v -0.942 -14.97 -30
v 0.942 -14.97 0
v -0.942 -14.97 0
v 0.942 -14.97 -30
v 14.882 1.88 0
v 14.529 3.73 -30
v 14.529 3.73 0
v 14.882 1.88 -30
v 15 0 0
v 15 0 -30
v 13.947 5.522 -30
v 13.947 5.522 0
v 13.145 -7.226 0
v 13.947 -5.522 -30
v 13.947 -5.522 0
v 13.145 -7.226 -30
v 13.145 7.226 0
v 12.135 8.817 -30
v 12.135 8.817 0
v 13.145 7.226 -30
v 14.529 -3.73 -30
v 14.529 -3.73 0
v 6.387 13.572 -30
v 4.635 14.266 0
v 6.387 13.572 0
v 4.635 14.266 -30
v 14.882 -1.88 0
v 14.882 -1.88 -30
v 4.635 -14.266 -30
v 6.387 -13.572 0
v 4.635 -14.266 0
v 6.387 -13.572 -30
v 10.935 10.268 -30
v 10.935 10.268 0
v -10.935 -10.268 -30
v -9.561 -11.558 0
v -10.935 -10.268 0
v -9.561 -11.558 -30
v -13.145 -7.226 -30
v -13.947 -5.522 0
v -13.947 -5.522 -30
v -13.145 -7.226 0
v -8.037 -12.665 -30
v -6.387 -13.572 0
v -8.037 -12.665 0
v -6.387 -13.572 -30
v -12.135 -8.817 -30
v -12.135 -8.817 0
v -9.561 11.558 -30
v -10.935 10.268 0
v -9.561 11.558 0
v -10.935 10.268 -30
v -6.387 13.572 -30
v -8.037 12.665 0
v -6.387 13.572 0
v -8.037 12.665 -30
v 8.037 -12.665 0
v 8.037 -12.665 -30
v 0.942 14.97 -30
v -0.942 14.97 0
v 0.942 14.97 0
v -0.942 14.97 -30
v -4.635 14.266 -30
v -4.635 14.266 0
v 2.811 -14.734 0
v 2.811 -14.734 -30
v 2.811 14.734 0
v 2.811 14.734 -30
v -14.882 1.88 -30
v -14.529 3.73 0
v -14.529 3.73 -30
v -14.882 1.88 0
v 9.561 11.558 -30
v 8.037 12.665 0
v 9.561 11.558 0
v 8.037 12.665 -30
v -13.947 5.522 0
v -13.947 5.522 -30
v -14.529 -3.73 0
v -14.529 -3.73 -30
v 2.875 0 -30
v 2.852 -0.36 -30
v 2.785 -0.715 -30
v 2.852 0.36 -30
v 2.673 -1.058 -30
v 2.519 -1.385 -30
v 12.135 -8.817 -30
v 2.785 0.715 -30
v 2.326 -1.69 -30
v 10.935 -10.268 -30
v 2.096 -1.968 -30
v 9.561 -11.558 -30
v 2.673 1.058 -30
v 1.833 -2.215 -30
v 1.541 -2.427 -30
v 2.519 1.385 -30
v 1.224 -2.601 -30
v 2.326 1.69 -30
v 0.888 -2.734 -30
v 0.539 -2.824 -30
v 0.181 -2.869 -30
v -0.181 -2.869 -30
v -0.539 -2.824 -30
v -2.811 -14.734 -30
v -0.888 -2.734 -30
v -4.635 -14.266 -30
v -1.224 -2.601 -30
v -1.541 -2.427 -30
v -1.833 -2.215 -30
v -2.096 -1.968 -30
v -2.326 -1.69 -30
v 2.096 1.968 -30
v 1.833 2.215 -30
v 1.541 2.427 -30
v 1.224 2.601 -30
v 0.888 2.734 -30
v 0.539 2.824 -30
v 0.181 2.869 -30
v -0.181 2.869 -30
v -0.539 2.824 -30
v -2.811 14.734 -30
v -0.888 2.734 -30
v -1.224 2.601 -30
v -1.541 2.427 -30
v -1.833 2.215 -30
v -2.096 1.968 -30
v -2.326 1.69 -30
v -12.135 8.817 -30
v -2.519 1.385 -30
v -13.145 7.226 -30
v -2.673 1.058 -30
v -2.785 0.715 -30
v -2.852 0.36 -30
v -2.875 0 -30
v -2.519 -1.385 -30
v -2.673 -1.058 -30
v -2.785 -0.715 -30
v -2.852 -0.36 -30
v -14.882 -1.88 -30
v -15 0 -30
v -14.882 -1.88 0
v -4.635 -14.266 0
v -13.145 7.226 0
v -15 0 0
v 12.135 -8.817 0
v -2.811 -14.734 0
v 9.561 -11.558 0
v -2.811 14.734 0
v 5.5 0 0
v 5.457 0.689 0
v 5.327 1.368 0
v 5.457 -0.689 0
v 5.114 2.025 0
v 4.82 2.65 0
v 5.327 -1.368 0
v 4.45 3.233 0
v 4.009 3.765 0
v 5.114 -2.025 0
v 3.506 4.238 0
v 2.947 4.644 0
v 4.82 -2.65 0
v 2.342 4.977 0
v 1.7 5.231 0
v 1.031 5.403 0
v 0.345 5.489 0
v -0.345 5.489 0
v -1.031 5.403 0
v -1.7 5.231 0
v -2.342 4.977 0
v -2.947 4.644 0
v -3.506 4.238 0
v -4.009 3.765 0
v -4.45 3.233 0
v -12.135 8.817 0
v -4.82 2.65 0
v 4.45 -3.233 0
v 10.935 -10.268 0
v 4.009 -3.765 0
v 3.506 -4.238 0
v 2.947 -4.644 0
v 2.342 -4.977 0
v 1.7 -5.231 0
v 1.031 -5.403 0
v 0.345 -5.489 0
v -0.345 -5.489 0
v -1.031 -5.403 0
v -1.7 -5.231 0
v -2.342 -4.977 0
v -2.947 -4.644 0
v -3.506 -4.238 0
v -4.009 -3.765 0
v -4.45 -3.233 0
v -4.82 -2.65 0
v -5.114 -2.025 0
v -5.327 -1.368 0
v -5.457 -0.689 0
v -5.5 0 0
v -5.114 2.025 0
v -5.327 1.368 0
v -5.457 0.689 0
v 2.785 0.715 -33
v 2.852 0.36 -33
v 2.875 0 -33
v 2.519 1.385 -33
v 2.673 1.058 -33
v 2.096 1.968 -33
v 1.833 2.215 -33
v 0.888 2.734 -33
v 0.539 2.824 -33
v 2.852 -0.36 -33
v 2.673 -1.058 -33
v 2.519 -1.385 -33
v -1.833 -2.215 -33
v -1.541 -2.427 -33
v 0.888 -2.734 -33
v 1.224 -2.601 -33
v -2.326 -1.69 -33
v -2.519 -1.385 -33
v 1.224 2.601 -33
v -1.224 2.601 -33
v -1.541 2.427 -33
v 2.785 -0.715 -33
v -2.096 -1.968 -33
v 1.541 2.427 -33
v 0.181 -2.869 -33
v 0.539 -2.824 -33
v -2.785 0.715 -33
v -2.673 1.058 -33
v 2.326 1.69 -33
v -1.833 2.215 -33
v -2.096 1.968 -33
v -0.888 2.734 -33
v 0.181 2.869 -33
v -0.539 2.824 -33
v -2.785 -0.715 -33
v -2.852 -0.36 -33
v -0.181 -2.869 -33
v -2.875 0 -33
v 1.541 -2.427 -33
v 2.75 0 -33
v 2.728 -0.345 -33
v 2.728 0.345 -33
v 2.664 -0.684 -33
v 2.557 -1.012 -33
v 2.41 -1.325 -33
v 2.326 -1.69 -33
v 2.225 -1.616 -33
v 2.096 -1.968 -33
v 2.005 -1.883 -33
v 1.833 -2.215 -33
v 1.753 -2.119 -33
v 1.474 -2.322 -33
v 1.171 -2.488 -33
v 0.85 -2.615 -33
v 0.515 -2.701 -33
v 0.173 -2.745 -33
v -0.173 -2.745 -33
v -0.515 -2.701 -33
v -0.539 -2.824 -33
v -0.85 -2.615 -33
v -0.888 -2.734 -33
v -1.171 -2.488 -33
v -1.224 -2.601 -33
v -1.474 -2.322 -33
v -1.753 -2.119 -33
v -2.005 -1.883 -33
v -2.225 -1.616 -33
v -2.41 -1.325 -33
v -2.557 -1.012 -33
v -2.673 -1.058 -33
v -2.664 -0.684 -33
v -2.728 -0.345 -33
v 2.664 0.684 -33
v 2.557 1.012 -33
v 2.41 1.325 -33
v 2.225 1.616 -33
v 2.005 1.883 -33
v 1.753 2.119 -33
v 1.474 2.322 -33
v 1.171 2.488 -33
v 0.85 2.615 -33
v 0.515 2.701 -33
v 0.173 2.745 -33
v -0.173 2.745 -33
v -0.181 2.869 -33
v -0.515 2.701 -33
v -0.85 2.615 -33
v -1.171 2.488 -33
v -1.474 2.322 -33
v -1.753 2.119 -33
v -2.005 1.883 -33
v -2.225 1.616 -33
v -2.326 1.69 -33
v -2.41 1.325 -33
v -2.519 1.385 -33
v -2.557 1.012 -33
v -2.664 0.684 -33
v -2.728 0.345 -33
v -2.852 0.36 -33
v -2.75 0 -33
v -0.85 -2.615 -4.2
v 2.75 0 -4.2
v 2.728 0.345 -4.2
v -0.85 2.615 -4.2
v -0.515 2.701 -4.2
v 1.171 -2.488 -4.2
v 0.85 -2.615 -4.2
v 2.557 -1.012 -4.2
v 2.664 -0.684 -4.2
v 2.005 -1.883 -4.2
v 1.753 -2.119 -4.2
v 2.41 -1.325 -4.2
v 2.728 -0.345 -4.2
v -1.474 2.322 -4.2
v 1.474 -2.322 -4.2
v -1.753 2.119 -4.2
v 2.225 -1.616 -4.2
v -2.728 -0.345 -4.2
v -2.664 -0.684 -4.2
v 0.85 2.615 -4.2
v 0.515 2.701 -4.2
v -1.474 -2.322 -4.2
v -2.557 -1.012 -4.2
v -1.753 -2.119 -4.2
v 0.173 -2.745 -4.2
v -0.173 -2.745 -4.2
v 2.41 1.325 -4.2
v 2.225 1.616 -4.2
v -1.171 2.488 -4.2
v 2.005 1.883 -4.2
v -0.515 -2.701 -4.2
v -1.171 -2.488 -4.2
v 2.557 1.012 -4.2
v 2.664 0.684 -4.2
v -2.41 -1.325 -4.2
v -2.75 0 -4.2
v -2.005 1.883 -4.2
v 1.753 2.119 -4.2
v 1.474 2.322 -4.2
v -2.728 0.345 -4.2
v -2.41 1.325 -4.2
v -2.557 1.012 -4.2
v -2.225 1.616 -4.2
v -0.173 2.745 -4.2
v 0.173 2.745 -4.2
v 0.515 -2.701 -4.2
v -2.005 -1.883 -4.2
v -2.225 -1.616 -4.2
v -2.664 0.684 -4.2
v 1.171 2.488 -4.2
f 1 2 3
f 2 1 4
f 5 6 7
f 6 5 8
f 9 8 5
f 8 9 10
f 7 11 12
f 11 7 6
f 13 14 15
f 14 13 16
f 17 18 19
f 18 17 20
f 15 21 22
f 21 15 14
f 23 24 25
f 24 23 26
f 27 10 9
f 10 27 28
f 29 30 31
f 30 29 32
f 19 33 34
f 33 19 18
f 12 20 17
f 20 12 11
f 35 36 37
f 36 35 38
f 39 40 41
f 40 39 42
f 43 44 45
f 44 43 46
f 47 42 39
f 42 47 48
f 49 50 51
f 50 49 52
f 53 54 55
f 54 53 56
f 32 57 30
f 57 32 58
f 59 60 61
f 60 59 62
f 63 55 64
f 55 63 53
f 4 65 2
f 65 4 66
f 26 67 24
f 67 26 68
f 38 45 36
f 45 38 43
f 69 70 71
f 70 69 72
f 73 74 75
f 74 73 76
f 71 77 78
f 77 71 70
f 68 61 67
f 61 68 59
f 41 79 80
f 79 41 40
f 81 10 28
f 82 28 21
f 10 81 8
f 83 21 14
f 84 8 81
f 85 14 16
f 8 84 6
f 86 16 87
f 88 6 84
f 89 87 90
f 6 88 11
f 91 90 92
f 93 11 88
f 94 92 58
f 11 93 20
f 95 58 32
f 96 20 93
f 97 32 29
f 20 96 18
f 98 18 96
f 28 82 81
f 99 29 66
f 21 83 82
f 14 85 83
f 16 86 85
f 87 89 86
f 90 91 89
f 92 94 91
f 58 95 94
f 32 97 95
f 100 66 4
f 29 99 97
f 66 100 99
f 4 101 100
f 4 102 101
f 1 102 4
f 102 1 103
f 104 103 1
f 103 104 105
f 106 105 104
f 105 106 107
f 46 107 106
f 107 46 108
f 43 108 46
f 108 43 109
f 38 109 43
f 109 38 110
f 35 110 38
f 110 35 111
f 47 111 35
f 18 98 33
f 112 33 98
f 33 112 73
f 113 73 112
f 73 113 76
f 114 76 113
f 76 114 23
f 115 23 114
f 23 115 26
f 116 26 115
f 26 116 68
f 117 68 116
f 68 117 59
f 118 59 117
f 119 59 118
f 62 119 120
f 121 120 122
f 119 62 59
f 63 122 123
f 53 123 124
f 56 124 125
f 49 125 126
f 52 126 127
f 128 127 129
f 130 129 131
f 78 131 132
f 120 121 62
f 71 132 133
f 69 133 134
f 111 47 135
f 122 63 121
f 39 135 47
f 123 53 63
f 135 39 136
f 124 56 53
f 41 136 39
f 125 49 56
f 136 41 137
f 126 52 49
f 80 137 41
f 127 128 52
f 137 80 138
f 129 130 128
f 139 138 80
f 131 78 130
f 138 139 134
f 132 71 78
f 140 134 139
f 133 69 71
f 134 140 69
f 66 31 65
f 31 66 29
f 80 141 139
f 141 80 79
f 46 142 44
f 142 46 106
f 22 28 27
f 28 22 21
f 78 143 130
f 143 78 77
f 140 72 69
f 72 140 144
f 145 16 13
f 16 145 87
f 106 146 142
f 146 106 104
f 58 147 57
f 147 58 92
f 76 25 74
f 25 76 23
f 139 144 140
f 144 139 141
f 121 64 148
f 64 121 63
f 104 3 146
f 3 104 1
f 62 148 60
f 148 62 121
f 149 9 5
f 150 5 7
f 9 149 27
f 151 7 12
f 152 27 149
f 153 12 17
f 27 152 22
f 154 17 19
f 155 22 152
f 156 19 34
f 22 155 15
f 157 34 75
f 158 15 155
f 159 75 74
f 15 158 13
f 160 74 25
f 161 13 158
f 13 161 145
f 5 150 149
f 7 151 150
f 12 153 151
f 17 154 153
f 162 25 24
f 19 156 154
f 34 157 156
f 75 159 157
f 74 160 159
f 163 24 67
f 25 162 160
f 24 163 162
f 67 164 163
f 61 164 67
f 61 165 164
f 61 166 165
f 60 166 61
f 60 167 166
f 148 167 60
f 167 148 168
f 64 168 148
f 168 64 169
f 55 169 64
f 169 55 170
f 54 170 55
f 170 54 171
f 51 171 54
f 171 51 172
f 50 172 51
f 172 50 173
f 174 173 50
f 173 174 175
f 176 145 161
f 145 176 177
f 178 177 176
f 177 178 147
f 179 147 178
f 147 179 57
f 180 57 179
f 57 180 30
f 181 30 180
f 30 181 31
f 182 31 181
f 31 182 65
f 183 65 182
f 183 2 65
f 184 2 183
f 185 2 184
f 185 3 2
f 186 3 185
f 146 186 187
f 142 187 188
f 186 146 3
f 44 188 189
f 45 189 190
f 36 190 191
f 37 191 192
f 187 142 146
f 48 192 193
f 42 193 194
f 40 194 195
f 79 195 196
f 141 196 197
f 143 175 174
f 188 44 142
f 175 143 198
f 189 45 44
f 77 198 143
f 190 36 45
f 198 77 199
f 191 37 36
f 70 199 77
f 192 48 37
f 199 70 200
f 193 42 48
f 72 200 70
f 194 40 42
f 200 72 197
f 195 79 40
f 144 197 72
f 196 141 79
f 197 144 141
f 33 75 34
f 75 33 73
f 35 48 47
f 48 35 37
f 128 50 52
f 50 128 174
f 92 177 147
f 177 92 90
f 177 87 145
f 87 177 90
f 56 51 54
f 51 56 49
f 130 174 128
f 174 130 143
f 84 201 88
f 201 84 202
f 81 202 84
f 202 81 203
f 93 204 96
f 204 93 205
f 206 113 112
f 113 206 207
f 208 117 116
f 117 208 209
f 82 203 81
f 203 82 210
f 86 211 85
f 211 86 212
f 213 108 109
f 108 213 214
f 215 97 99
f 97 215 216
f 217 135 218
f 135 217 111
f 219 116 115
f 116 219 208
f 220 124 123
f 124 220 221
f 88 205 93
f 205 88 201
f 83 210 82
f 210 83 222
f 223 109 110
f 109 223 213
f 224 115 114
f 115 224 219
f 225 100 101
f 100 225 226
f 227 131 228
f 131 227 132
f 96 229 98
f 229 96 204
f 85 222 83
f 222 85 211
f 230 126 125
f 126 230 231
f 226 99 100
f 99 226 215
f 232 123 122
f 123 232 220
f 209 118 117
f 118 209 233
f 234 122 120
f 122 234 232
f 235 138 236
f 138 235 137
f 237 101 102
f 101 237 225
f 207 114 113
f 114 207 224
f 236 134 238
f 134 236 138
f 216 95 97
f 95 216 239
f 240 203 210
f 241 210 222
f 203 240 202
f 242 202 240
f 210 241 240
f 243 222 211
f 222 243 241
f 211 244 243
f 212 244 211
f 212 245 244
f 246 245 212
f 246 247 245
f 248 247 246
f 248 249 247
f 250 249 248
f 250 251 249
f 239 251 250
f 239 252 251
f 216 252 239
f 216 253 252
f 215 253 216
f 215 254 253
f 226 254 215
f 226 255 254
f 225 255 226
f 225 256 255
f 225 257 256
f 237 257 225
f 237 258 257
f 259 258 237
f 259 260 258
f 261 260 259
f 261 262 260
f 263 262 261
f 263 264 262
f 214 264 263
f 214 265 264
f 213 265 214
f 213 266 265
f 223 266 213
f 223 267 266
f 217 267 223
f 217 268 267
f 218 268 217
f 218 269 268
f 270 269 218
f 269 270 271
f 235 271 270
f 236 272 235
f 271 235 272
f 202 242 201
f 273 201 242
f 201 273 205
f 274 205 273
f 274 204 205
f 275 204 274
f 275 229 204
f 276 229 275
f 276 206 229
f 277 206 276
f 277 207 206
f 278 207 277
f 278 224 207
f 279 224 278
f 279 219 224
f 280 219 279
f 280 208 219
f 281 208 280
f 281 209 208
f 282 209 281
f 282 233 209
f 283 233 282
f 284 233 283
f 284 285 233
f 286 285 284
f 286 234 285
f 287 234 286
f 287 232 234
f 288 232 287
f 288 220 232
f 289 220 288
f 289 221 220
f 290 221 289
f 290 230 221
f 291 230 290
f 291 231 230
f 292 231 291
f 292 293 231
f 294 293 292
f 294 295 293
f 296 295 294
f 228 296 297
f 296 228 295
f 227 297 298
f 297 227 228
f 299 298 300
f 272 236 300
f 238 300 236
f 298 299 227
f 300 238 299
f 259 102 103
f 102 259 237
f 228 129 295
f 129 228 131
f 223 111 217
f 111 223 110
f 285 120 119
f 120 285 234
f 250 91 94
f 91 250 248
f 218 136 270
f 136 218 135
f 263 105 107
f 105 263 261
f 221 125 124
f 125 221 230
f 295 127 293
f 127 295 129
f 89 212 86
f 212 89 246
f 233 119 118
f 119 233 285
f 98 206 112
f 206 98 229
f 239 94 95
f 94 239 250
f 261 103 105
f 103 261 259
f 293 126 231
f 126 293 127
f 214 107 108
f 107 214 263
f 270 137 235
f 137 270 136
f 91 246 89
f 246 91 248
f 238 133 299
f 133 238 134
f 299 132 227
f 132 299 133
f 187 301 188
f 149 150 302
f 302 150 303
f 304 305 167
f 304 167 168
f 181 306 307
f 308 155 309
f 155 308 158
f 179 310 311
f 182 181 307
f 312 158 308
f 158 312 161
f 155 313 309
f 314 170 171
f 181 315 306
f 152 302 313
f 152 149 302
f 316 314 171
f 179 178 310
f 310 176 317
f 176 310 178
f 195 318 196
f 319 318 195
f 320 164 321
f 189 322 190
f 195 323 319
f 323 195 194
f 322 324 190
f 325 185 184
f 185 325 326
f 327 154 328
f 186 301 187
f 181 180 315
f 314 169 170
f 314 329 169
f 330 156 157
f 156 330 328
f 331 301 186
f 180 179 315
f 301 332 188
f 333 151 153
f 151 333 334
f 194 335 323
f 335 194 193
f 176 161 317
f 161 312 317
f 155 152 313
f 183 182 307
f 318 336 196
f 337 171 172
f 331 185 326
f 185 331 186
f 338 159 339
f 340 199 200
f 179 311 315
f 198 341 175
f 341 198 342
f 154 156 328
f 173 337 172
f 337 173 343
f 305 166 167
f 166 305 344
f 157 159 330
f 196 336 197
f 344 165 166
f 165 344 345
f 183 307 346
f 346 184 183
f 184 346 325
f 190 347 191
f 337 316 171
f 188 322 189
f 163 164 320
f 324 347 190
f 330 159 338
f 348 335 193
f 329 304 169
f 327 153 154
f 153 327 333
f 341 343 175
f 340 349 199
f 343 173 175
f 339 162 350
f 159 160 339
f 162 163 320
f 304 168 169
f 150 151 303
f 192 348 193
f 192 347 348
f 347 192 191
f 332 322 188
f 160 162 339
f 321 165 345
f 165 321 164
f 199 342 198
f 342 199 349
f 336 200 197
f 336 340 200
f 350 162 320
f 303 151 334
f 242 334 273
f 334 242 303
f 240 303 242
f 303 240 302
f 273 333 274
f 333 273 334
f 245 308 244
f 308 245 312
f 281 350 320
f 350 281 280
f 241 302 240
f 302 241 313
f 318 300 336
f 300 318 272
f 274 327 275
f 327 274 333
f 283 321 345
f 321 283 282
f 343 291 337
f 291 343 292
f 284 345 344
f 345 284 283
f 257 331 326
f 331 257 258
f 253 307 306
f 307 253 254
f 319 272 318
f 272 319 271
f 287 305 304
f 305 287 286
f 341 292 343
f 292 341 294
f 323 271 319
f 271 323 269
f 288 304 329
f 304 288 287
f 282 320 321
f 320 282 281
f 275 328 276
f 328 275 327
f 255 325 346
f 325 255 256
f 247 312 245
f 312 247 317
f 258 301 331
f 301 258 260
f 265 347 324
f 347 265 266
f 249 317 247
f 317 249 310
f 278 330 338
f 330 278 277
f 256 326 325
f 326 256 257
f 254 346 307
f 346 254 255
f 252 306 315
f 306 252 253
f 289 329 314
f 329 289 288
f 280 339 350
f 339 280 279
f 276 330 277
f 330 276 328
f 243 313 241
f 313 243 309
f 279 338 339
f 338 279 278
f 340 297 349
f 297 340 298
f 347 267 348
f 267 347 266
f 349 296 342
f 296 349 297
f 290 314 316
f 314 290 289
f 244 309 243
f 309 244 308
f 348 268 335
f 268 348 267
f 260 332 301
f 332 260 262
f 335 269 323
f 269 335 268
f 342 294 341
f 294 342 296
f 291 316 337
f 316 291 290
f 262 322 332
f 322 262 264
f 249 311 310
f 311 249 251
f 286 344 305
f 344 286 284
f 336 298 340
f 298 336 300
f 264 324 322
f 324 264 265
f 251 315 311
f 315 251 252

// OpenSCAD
$fn = 50;

difference() {
	union() {
		translate(v = [0, 0, -30.0]) {
			cylinder(h = 30, r = 15.0);
		}
		#translate(v = [0, 0, -33.0]) {
			cylinder(h = 33, r = 2.875);
		}
	}
	union() {
		translate(v = [0, 0, 0]) {
			rotate(a = [0, 0, 0]) {
				difference() {
					union() {
						translate(v = [0, 0, -33.0]) {
							cylinder(h = 33, r = 2.25);
						}
						translate(v = [0, 0, -4.2]) {
							cylinder(h = 4.2, r1 = 2.75, r2 = 5.5);
						}
						translate(v = [0, 0, -33.0]) {
							cylinder(h = 33, r = 2.75);
						}
						translate(v = [0, 0, -33.0]) {
							cylinder(h = 33, r = 2.25);
						}
					}
					union();
				}
			}
		}
	}
}
